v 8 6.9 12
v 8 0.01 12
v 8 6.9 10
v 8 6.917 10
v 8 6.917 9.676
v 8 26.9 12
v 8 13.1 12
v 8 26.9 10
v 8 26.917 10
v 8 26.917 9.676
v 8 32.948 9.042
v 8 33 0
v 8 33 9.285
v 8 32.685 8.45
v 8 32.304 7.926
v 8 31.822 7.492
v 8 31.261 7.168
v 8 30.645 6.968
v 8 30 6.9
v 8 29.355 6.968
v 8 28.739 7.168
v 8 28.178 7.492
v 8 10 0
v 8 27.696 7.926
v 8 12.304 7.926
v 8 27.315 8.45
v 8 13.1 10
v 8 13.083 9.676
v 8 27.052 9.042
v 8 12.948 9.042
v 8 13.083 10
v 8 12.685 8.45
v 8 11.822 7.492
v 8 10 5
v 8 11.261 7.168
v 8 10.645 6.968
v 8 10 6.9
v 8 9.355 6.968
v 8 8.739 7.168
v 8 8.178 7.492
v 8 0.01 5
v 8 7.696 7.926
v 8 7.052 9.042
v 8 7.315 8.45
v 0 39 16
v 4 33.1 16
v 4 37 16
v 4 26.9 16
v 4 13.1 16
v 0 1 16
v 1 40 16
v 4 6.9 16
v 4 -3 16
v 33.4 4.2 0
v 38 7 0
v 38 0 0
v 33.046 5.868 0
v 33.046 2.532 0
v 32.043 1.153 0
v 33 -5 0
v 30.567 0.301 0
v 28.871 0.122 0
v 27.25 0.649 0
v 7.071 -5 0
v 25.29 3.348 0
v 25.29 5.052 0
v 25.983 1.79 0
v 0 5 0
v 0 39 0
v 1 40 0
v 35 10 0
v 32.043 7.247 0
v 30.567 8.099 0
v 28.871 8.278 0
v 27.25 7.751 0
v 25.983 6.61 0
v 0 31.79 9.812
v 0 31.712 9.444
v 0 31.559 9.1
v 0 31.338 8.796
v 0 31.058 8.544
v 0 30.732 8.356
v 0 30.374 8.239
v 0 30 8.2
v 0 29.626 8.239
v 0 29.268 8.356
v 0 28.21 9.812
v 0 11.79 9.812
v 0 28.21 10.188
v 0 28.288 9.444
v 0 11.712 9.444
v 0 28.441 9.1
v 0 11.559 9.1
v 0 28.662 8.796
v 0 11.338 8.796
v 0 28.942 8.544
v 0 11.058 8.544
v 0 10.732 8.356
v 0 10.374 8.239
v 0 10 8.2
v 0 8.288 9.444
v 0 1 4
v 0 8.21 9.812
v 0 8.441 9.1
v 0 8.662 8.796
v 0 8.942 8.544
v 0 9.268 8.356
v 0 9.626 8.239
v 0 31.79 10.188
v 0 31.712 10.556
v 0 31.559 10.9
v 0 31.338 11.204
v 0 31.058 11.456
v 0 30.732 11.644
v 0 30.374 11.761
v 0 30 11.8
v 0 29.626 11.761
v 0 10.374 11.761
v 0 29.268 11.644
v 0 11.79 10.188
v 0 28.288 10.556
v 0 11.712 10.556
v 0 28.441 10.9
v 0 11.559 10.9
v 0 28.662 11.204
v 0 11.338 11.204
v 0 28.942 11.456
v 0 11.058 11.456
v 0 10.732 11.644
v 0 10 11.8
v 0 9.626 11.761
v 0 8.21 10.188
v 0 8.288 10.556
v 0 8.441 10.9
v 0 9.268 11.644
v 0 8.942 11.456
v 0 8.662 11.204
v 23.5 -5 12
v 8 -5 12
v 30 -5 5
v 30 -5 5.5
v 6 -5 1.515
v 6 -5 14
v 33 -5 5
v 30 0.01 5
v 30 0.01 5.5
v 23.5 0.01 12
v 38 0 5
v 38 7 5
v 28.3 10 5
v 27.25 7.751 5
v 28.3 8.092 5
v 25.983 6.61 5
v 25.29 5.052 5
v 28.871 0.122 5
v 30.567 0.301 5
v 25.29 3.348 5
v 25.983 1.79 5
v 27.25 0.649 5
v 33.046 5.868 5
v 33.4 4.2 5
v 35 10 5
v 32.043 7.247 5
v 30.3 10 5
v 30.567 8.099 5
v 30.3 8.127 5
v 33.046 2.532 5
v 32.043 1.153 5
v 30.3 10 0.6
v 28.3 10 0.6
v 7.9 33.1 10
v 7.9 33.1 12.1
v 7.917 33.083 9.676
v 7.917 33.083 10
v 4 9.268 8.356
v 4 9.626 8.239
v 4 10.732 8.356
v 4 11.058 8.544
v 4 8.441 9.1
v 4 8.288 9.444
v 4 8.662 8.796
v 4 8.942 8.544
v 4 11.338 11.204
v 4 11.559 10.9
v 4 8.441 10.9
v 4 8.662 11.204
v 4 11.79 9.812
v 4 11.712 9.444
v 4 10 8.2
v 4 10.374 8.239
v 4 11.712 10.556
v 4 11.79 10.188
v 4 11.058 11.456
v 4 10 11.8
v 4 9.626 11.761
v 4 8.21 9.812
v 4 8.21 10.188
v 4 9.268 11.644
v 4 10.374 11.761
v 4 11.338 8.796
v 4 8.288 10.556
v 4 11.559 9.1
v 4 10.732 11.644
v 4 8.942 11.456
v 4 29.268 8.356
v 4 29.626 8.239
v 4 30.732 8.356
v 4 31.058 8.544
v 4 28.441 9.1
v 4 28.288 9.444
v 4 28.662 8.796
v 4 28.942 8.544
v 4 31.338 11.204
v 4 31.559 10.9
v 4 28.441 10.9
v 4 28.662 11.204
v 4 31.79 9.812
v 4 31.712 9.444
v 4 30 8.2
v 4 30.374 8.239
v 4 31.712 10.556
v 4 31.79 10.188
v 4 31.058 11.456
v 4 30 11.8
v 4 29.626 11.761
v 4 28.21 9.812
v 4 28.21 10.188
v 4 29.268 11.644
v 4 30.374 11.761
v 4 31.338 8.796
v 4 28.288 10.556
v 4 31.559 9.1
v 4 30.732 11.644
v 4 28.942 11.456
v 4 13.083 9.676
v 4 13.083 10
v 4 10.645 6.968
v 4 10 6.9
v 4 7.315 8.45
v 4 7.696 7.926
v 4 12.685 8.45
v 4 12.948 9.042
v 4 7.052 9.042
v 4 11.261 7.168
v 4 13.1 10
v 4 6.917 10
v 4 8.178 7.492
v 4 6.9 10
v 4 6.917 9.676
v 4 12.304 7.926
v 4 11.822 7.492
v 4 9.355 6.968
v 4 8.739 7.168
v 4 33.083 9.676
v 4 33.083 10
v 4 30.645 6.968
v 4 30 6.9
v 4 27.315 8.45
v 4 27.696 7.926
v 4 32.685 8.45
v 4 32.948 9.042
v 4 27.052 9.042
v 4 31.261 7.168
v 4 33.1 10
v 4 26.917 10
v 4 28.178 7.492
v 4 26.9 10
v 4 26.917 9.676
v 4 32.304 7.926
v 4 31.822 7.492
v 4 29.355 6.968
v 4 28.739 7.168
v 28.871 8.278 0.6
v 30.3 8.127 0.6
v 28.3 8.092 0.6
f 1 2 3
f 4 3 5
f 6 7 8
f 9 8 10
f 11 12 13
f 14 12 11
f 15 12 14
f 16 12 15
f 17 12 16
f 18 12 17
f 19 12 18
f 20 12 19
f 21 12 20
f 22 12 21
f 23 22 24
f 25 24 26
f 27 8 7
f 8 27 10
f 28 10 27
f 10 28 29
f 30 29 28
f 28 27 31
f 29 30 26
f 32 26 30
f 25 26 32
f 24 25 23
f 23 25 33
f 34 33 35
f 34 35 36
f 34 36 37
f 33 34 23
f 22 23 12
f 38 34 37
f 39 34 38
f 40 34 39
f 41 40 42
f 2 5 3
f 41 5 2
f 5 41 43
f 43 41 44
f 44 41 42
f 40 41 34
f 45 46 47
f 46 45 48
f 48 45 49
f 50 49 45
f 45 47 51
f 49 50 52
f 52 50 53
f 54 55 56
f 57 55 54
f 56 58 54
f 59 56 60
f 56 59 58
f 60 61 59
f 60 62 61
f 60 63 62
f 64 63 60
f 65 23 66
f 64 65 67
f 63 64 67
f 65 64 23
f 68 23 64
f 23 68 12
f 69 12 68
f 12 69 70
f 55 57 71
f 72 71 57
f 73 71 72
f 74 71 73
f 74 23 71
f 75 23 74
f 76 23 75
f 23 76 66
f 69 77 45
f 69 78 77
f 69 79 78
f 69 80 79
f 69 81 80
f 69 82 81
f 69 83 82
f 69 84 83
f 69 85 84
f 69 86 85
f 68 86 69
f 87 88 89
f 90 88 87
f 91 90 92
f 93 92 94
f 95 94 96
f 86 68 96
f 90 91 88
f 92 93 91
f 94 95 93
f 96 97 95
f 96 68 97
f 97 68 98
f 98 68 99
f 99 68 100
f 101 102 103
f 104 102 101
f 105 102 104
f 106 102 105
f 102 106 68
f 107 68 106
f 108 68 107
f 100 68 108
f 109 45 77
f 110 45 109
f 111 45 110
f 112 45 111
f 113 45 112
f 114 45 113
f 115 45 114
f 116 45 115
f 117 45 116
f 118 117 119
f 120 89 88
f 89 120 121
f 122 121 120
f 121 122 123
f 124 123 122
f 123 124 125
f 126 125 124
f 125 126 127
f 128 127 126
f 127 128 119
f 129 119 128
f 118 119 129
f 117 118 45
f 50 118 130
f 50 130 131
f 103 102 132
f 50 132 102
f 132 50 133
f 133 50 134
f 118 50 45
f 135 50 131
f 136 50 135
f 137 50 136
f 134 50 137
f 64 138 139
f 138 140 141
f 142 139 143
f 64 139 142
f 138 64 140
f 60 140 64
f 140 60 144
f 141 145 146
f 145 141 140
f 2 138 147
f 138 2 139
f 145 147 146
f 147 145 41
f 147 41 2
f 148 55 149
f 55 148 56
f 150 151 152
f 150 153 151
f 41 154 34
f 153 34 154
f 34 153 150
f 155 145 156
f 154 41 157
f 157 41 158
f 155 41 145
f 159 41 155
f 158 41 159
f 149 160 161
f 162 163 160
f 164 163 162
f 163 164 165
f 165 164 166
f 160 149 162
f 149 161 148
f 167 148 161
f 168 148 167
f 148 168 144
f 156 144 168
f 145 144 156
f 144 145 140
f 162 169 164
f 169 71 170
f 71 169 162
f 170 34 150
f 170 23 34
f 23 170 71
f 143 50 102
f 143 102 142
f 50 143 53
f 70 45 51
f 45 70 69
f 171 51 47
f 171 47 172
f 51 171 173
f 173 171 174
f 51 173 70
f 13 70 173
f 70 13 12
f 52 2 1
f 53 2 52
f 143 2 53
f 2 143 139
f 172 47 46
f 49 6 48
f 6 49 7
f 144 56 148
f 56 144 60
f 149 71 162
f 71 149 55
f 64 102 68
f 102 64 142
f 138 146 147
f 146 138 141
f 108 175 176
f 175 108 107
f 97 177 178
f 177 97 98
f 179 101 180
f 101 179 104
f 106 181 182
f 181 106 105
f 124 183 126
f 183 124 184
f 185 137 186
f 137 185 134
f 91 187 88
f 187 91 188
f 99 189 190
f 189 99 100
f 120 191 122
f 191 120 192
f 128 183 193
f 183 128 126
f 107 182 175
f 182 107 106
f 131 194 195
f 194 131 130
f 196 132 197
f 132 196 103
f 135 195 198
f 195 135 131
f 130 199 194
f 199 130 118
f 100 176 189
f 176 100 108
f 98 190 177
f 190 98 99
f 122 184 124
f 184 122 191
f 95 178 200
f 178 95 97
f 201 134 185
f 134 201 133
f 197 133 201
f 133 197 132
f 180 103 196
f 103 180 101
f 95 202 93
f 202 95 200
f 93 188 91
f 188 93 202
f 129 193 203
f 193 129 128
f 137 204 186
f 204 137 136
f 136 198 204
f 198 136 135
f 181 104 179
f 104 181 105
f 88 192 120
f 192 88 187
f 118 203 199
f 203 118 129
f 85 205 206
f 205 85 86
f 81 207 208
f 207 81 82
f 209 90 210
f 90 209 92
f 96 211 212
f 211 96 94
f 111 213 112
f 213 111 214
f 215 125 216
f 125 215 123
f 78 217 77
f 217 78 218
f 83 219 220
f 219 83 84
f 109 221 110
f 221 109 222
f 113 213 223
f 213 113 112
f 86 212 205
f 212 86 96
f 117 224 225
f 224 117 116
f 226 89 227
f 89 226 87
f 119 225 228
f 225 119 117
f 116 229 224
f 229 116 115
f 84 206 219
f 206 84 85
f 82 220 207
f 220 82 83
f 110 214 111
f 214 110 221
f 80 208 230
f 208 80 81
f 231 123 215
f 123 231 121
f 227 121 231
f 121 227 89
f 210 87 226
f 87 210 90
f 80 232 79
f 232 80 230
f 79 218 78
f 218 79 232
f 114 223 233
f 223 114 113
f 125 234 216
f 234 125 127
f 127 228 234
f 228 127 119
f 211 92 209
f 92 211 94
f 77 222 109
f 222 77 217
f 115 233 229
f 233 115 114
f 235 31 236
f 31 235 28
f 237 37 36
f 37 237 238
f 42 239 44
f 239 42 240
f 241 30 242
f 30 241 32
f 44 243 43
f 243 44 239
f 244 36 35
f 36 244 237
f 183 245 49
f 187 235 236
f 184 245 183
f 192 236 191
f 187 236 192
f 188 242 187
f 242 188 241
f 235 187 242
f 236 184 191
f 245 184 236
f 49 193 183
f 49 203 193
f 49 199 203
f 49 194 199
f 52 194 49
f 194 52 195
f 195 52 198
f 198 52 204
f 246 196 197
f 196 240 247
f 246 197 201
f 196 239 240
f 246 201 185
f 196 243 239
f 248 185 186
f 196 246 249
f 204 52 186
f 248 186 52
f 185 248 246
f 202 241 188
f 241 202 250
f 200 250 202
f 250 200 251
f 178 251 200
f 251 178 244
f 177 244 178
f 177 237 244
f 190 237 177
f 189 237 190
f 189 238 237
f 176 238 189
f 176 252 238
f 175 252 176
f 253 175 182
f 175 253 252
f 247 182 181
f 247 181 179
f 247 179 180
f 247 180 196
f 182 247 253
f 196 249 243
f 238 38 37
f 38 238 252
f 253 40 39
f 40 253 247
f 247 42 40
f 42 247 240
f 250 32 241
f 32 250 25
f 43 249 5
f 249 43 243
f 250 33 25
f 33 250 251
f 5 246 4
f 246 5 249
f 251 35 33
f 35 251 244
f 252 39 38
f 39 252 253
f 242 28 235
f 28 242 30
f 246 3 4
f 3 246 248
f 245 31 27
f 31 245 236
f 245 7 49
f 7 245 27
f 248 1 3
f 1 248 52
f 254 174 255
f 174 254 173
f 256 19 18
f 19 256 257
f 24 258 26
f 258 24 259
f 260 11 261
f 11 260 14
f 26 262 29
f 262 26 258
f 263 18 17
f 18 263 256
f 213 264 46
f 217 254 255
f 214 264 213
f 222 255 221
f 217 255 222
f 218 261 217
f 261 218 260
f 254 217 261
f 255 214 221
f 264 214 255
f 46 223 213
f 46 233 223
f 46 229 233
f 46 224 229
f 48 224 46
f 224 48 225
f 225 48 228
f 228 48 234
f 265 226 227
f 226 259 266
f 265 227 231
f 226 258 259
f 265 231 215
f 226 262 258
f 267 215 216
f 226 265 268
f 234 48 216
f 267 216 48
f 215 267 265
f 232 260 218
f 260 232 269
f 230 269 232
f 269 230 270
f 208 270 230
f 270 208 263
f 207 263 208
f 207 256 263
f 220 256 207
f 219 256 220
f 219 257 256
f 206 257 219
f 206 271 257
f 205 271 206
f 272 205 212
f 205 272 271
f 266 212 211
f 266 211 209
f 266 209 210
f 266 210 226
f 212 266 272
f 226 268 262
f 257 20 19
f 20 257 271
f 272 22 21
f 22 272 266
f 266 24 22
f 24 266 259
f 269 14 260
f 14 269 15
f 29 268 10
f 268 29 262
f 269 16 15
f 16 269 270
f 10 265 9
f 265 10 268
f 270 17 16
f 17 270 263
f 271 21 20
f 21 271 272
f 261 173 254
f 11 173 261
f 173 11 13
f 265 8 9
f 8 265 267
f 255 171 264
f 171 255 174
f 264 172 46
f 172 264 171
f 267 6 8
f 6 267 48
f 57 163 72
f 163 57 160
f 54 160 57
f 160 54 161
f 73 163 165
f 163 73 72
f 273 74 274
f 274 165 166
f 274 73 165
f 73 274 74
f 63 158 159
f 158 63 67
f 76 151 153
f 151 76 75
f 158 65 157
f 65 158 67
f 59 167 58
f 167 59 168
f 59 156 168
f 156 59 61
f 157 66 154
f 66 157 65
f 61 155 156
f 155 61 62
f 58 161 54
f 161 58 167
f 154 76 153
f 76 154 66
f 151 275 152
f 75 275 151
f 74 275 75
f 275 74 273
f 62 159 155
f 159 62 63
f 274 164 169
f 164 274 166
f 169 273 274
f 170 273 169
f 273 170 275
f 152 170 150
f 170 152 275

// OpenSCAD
// PRUSA iteration3
// Z axis top holder
// GNU GPL v3
// Josef Průša <iam@josefprusa.cz> and contributors
// http://www.reprap.org/wiki/Prusa_Mendel
// http://prusamendel.org

module z_top_base(){
 translate([0,-5,0]) cube([8,45,16]); // plate touching the base
 translate([0,-5,0]) cube([30,5.01,12]); // plate touching the base
 translate([0,-5,0]) cube([38,15,5]); // plate touching the base
}

module z_top_fancy(){
 // Corner cutouts
 translate([0.5,0.5,0]) rotate([0,0,-45-180]) translate([-15,0,-1]) cube([30,30,51]);
 translate([0.5,40-0.5,0]) rotate([0,0,-45+90]) translate([-15,0,-1]) cube([30,30,51]);
 translate([-4,40+5,0]) rotate([0,0,-45-0]) translate([0,0,-1]) cube([30,30,51]);
 translate([8,0,12]) rotate([0,-45,0]) translate([0,-5,0]) cube([30,50,30]);
 translate([38-2.5,-5+2.5,0]) rotate([0,0,-45-90]) translate([-15,0,-1]) cube([30,30,51]);
 translate([38-1.5,10-1.5,0]) rotate([0,0,-45]) translate([-15,0,-1]) cube([30,30,51]);
 translate([0,0,5]) rotate([45+180,0,0]) rotate([0,0,-45+90]) translate([0,0,-15]) cube([30,30,30]);

// Stiffner cut out
 translate([30,0,5.5]) rotate([0,-45,0]) translate([0,-5,0]) cube([30,50,30]);
}

module z_top_holes(){
 // Screw holes
 translate([-1,10,10]) rotate([0,90,0]) cylinder(h = 20, r=1.8, $fn=30);
 translate([-1,10+20,10]) rotate([0,90,0]) cylinder(h = 20, r=1.8, $fn=30);

 // Screw heads
 translate([4,10,10]) rotate([0,90,0]) cylinder(h = 20, r=3.1, $fn=30);
 translate([4,10-3.1,10]) cube([10,6.2,10]);
 translate([4,10+20,10]) rotate([0,90,0]) cylinder(h = 20, r=3.1, $fn=30);
 translate([4,10+20-3.1,10]) cube([10,6.2,10]);

 // Z rod holder
 translate([25+4.3,4.2,-1]) rotate([0,0,0]) cylinder(h = 50, r=4.1, $fn=15);
 translate([25+4.3-1,3,0.6]) cube([2,10,7]); // it's bit up because it helps with printing
}

// Final part
module z_top(){
 difference(){
  z_top_base();
  z_top_fancy();
  z_top_holes();
 }
 *translate([0,-13,0]) mirror([0,1,0]) difference(){
  z_top_base();
  z_top_fancy();
  z_top_holes();
 }
}

z_top();
